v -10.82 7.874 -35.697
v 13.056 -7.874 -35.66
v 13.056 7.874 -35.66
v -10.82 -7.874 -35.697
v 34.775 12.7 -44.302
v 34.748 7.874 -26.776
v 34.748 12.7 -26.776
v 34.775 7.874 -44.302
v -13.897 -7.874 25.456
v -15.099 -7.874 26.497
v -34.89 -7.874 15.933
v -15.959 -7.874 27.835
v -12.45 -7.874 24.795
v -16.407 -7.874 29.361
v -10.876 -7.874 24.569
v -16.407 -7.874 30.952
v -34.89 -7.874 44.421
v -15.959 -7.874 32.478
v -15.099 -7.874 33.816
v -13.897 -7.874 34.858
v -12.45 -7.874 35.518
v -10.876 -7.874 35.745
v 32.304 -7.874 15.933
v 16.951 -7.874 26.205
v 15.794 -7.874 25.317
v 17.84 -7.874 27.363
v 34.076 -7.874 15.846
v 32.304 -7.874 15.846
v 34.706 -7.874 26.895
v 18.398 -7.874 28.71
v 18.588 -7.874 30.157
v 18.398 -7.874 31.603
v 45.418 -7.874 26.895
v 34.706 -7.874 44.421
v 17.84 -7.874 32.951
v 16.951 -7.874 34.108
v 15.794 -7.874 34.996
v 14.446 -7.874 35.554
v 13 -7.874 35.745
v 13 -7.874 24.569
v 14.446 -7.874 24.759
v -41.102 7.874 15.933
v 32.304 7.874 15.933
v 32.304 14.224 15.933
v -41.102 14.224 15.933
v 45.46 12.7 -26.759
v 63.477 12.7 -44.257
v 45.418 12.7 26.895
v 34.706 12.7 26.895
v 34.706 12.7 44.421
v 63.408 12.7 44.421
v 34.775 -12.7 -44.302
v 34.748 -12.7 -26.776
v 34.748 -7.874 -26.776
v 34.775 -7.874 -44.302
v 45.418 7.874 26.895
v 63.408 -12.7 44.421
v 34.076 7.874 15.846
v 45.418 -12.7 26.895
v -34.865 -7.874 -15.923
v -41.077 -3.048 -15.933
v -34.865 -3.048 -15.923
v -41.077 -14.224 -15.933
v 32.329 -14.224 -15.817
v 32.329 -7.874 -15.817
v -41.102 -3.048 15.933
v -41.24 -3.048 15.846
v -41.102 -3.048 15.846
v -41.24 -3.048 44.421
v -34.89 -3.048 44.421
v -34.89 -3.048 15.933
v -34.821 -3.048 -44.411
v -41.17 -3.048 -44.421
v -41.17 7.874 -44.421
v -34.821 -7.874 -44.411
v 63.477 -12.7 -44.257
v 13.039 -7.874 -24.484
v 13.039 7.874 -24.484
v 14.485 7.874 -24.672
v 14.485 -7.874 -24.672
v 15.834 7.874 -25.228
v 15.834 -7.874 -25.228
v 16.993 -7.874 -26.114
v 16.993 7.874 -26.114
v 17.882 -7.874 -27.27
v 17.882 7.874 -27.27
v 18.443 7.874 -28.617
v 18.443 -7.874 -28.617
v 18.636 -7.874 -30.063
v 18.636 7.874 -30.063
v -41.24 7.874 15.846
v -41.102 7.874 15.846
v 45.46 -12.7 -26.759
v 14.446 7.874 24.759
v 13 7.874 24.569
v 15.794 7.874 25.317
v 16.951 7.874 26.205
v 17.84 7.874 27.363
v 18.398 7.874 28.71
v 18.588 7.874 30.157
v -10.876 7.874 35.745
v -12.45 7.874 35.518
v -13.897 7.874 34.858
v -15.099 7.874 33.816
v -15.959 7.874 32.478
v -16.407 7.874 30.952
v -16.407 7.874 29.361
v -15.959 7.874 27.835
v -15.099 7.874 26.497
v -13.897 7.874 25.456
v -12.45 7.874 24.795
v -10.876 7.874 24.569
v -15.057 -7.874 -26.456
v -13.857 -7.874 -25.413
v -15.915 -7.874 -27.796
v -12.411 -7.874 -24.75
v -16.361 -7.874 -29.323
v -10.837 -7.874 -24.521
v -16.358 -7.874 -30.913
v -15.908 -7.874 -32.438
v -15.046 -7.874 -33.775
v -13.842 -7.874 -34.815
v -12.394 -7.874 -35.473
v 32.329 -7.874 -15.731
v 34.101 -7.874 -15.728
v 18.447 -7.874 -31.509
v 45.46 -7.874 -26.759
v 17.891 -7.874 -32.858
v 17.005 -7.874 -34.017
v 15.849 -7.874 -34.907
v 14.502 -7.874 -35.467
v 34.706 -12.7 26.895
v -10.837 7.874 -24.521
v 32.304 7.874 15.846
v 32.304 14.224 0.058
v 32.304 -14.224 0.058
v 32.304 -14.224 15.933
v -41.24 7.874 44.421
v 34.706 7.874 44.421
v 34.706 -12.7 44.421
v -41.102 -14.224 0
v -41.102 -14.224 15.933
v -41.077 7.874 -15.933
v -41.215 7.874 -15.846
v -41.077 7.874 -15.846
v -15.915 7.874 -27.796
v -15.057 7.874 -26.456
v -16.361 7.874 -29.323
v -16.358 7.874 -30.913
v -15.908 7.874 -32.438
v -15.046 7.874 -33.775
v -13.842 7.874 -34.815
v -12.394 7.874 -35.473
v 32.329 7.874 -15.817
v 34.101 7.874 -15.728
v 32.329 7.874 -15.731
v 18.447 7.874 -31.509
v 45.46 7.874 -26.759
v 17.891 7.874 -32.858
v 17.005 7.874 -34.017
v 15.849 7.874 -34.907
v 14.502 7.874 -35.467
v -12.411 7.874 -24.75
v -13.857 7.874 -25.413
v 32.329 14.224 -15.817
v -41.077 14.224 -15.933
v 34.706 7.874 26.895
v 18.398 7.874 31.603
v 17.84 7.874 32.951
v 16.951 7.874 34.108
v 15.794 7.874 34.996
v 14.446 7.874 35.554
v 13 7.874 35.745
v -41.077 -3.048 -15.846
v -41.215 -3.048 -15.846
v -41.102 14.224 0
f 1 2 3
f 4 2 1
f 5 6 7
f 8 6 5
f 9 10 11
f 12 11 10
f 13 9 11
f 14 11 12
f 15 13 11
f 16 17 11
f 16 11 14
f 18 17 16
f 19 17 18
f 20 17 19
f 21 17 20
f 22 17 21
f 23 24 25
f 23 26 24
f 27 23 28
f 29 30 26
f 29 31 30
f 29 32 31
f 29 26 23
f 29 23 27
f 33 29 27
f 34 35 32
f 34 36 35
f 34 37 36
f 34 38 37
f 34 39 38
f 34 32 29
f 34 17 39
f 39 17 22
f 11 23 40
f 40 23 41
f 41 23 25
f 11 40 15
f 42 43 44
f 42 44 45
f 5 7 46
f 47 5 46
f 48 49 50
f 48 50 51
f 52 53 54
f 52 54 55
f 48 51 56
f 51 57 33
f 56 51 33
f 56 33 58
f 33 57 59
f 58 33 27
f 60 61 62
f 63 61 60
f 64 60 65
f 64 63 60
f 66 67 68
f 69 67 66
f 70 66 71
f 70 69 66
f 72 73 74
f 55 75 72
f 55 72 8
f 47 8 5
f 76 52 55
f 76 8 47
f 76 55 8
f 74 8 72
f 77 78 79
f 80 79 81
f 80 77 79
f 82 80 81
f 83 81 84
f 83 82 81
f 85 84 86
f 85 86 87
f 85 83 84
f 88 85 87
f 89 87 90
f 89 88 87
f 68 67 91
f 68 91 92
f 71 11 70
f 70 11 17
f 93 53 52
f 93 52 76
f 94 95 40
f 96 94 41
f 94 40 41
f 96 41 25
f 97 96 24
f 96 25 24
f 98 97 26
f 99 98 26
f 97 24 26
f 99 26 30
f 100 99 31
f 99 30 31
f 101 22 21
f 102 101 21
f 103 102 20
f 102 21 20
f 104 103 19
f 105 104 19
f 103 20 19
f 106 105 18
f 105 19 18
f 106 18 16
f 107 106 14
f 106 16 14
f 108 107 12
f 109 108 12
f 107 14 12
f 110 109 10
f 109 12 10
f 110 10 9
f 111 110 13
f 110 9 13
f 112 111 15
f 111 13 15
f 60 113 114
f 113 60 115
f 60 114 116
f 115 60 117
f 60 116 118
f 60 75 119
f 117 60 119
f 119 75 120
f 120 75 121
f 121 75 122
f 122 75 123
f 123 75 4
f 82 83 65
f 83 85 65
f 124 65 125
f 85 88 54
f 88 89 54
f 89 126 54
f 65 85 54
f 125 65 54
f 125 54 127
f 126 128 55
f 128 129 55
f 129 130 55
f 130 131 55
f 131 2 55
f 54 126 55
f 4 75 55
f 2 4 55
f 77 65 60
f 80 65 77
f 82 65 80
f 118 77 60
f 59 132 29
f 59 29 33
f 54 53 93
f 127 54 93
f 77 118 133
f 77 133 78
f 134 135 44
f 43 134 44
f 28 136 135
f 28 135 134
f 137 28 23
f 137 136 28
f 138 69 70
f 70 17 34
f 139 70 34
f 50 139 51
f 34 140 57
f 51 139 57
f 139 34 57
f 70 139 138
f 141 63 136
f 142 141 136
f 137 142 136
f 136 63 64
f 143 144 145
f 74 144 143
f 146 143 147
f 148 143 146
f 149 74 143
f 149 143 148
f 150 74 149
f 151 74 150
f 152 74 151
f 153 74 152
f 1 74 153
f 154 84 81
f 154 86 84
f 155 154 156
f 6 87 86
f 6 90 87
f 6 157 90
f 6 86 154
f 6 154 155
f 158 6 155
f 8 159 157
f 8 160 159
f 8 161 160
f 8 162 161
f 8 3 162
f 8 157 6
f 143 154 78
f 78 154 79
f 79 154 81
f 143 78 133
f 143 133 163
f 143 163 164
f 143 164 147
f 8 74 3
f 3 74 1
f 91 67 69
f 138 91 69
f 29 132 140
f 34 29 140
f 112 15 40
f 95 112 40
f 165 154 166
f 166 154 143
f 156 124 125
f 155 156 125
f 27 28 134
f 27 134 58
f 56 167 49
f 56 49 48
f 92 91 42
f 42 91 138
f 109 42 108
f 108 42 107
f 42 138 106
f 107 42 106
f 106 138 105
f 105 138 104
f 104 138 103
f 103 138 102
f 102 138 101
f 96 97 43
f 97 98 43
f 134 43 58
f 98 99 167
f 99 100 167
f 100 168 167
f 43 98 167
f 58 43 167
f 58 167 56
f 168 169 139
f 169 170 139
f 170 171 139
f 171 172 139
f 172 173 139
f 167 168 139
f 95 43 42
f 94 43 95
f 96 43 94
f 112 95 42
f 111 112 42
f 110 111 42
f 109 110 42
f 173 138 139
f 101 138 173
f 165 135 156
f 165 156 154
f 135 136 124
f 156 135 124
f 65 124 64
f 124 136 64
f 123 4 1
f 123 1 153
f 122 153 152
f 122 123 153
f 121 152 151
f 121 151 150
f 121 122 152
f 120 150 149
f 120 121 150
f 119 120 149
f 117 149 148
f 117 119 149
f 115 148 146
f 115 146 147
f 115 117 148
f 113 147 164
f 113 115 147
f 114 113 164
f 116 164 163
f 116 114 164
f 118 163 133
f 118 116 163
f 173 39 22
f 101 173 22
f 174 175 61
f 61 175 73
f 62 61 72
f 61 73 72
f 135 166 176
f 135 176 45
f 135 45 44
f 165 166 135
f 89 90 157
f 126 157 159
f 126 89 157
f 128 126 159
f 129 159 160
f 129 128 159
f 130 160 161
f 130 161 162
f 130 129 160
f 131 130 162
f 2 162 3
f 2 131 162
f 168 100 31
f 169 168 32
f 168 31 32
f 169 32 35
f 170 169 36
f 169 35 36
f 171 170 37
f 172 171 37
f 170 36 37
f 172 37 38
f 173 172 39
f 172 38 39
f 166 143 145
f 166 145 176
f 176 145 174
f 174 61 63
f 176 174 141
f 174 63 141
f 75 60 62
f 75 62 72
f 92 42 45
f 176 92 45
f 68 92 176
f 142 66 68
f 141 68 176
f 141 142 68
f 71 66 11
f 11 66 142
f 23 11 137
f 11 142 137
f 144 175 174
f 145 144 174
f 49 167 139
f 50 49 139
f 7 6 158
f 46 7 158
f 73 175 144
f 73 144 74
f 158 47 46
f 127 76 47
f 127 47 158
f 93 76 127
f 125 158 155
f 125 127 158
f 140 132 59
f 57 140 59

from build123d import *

# Parameters (mm, degrees)
F1_DEPTH  = 14.224
F2_W      = 104.648
F2_H      = 28.575
F3_DEPTH  = 7.874
F5_DEPTH  = 4.826
F6_W      = 28.702
F6_H      = 17.526
F7_DEPTH  = 12.7
F9_DEPTH  = 12.7
F11_DEPTH = 25.4


with BuildPart() as f1:
    # F0 (on Front) → F1 (new body, symmetric)
    with BuildSketch(Plane.XZ):
        Polygon((32.3041829584, 0.0577278724), (32.3041829584, 15.9327278724), (-41.1018170416, 15.9327278724), (-41.1018170416, 0), align=None)
    extrude(amount=F1_DEPTH, both=True)

    # F2 (on Front) → F3 (join, symmetric)
    with BuildSketch(Plane.XZ):
        with Locations((11.0836382955, 30.133637134)):
            Rectangle(F2_W, F2_H)
    extrude(amount=F3_DEPTH, both=True)

    # F4 (on face) → F5 (cut)
    with BuildSketch(Plane.XZ.offset(7.874)):
        Polygon((-34.8903617045, 44.421137134), (-41.2403617045, 44.421137134), (-41.2403617045, 15.846137134), (-41.1018170416, 15.846137134), (-41.1018170416, 15.9327278724), (-34.8903617045, 15.9327278724), align=None)
    extrude(amount=-F5_DEPTH, mode=Mode.SUBTRACT)

    # F6 (on Front) → F7 (join, symmetric)
    with BuildSketch(Plane.XZ):
        with Locations((49.0566382955, 35.658137134)):
            Rectangle(F6_W, F6_H)
    extrude(amount=F7_DEPTH, both=True)

    # F8 (on Front) → F9 (cut, symmetric)
    with BuildSketch(Plane.XZ):
        Polygon((63.4076382955, 44.421137134), (34.0538099408, 15.824187547), (63.4076382955, 15.846137134), align=None)
    extrude(amount=F9_DEPTH, both=True, mode=Mode.SUBTRACT)

    # F10 (on face) → F11 (cut)
    with BuildSketch(Plane.XZ.offset(7.874)):
        with BuildLine():
            ThreePointArc((13.0001829584, 35.7447278724), (7.4121829584, 30.1567278724), (13.0001829584, 24.5687278724))
            ThreePointArc((13.0001829584, 24.5687278724), (16.9514956516, 26.2054151791), (18.5881829584, 30.1567278724))
            ThreePointArc((18.5881829584, 30.1567278724), (16.9514956516, 34.1080405657), (13.0001829584, 35.7447278724))
        make_face()
        with BuildLine():
            ThreePointArc((-10.8758170416, 35.7447278724), (-16.4638170416, 30.1567278724), (-10.8758170416, 24.5687278724))
            ThreePointArc((-10.8758170416, 24.5687278724), (-6.9245043484, 26.2054151791), (-5.2878170416, 30.1567278724))
            ThreePointArc((-5.2878170416, 30.1567278724), (-6.9245043484, 34.1080405657), (-10.8758170416, 35.7447278724))
        make_face()
        with BuildLine():
            ThreePointArc((-5.2878170416, 30.1567278724), (-6.9245043484, 26.2054151791), (-10.8758170416, 24.5687278724))
            Line((-10.8758170416, 24.5687278724), (13.0001829584, 24.5687278724))
            ThreePointArc((13.0001829584, 24.5687278724), (7.4121829584, 30.1567278724), (13.0001829584, 35.7447278724))
            Line((13.0001829584, 35.7447278724), (-10.8758170416, 35.7447278724))
            ThreePointArc((-10.8758170416, 35.7447278724), (-6.9245043484, 34.1080405657), (-5.2878170416, 30.1567278724))
        make_face()
    extrude(amount=-F11_DEPTH, mode=Mode.SUBTRACT)

    # F12: F1 across face


with BuildPart() as f1_1:
    add(f1.part)
    add(f1.part.mirror(Plane(origin=(-4.3988170416, 0, 0.0288639362), x_dir=(1, 0, 0), z_dir=(0.0007864187, 0, -0.9999996908))))


solid = f1_1.part
